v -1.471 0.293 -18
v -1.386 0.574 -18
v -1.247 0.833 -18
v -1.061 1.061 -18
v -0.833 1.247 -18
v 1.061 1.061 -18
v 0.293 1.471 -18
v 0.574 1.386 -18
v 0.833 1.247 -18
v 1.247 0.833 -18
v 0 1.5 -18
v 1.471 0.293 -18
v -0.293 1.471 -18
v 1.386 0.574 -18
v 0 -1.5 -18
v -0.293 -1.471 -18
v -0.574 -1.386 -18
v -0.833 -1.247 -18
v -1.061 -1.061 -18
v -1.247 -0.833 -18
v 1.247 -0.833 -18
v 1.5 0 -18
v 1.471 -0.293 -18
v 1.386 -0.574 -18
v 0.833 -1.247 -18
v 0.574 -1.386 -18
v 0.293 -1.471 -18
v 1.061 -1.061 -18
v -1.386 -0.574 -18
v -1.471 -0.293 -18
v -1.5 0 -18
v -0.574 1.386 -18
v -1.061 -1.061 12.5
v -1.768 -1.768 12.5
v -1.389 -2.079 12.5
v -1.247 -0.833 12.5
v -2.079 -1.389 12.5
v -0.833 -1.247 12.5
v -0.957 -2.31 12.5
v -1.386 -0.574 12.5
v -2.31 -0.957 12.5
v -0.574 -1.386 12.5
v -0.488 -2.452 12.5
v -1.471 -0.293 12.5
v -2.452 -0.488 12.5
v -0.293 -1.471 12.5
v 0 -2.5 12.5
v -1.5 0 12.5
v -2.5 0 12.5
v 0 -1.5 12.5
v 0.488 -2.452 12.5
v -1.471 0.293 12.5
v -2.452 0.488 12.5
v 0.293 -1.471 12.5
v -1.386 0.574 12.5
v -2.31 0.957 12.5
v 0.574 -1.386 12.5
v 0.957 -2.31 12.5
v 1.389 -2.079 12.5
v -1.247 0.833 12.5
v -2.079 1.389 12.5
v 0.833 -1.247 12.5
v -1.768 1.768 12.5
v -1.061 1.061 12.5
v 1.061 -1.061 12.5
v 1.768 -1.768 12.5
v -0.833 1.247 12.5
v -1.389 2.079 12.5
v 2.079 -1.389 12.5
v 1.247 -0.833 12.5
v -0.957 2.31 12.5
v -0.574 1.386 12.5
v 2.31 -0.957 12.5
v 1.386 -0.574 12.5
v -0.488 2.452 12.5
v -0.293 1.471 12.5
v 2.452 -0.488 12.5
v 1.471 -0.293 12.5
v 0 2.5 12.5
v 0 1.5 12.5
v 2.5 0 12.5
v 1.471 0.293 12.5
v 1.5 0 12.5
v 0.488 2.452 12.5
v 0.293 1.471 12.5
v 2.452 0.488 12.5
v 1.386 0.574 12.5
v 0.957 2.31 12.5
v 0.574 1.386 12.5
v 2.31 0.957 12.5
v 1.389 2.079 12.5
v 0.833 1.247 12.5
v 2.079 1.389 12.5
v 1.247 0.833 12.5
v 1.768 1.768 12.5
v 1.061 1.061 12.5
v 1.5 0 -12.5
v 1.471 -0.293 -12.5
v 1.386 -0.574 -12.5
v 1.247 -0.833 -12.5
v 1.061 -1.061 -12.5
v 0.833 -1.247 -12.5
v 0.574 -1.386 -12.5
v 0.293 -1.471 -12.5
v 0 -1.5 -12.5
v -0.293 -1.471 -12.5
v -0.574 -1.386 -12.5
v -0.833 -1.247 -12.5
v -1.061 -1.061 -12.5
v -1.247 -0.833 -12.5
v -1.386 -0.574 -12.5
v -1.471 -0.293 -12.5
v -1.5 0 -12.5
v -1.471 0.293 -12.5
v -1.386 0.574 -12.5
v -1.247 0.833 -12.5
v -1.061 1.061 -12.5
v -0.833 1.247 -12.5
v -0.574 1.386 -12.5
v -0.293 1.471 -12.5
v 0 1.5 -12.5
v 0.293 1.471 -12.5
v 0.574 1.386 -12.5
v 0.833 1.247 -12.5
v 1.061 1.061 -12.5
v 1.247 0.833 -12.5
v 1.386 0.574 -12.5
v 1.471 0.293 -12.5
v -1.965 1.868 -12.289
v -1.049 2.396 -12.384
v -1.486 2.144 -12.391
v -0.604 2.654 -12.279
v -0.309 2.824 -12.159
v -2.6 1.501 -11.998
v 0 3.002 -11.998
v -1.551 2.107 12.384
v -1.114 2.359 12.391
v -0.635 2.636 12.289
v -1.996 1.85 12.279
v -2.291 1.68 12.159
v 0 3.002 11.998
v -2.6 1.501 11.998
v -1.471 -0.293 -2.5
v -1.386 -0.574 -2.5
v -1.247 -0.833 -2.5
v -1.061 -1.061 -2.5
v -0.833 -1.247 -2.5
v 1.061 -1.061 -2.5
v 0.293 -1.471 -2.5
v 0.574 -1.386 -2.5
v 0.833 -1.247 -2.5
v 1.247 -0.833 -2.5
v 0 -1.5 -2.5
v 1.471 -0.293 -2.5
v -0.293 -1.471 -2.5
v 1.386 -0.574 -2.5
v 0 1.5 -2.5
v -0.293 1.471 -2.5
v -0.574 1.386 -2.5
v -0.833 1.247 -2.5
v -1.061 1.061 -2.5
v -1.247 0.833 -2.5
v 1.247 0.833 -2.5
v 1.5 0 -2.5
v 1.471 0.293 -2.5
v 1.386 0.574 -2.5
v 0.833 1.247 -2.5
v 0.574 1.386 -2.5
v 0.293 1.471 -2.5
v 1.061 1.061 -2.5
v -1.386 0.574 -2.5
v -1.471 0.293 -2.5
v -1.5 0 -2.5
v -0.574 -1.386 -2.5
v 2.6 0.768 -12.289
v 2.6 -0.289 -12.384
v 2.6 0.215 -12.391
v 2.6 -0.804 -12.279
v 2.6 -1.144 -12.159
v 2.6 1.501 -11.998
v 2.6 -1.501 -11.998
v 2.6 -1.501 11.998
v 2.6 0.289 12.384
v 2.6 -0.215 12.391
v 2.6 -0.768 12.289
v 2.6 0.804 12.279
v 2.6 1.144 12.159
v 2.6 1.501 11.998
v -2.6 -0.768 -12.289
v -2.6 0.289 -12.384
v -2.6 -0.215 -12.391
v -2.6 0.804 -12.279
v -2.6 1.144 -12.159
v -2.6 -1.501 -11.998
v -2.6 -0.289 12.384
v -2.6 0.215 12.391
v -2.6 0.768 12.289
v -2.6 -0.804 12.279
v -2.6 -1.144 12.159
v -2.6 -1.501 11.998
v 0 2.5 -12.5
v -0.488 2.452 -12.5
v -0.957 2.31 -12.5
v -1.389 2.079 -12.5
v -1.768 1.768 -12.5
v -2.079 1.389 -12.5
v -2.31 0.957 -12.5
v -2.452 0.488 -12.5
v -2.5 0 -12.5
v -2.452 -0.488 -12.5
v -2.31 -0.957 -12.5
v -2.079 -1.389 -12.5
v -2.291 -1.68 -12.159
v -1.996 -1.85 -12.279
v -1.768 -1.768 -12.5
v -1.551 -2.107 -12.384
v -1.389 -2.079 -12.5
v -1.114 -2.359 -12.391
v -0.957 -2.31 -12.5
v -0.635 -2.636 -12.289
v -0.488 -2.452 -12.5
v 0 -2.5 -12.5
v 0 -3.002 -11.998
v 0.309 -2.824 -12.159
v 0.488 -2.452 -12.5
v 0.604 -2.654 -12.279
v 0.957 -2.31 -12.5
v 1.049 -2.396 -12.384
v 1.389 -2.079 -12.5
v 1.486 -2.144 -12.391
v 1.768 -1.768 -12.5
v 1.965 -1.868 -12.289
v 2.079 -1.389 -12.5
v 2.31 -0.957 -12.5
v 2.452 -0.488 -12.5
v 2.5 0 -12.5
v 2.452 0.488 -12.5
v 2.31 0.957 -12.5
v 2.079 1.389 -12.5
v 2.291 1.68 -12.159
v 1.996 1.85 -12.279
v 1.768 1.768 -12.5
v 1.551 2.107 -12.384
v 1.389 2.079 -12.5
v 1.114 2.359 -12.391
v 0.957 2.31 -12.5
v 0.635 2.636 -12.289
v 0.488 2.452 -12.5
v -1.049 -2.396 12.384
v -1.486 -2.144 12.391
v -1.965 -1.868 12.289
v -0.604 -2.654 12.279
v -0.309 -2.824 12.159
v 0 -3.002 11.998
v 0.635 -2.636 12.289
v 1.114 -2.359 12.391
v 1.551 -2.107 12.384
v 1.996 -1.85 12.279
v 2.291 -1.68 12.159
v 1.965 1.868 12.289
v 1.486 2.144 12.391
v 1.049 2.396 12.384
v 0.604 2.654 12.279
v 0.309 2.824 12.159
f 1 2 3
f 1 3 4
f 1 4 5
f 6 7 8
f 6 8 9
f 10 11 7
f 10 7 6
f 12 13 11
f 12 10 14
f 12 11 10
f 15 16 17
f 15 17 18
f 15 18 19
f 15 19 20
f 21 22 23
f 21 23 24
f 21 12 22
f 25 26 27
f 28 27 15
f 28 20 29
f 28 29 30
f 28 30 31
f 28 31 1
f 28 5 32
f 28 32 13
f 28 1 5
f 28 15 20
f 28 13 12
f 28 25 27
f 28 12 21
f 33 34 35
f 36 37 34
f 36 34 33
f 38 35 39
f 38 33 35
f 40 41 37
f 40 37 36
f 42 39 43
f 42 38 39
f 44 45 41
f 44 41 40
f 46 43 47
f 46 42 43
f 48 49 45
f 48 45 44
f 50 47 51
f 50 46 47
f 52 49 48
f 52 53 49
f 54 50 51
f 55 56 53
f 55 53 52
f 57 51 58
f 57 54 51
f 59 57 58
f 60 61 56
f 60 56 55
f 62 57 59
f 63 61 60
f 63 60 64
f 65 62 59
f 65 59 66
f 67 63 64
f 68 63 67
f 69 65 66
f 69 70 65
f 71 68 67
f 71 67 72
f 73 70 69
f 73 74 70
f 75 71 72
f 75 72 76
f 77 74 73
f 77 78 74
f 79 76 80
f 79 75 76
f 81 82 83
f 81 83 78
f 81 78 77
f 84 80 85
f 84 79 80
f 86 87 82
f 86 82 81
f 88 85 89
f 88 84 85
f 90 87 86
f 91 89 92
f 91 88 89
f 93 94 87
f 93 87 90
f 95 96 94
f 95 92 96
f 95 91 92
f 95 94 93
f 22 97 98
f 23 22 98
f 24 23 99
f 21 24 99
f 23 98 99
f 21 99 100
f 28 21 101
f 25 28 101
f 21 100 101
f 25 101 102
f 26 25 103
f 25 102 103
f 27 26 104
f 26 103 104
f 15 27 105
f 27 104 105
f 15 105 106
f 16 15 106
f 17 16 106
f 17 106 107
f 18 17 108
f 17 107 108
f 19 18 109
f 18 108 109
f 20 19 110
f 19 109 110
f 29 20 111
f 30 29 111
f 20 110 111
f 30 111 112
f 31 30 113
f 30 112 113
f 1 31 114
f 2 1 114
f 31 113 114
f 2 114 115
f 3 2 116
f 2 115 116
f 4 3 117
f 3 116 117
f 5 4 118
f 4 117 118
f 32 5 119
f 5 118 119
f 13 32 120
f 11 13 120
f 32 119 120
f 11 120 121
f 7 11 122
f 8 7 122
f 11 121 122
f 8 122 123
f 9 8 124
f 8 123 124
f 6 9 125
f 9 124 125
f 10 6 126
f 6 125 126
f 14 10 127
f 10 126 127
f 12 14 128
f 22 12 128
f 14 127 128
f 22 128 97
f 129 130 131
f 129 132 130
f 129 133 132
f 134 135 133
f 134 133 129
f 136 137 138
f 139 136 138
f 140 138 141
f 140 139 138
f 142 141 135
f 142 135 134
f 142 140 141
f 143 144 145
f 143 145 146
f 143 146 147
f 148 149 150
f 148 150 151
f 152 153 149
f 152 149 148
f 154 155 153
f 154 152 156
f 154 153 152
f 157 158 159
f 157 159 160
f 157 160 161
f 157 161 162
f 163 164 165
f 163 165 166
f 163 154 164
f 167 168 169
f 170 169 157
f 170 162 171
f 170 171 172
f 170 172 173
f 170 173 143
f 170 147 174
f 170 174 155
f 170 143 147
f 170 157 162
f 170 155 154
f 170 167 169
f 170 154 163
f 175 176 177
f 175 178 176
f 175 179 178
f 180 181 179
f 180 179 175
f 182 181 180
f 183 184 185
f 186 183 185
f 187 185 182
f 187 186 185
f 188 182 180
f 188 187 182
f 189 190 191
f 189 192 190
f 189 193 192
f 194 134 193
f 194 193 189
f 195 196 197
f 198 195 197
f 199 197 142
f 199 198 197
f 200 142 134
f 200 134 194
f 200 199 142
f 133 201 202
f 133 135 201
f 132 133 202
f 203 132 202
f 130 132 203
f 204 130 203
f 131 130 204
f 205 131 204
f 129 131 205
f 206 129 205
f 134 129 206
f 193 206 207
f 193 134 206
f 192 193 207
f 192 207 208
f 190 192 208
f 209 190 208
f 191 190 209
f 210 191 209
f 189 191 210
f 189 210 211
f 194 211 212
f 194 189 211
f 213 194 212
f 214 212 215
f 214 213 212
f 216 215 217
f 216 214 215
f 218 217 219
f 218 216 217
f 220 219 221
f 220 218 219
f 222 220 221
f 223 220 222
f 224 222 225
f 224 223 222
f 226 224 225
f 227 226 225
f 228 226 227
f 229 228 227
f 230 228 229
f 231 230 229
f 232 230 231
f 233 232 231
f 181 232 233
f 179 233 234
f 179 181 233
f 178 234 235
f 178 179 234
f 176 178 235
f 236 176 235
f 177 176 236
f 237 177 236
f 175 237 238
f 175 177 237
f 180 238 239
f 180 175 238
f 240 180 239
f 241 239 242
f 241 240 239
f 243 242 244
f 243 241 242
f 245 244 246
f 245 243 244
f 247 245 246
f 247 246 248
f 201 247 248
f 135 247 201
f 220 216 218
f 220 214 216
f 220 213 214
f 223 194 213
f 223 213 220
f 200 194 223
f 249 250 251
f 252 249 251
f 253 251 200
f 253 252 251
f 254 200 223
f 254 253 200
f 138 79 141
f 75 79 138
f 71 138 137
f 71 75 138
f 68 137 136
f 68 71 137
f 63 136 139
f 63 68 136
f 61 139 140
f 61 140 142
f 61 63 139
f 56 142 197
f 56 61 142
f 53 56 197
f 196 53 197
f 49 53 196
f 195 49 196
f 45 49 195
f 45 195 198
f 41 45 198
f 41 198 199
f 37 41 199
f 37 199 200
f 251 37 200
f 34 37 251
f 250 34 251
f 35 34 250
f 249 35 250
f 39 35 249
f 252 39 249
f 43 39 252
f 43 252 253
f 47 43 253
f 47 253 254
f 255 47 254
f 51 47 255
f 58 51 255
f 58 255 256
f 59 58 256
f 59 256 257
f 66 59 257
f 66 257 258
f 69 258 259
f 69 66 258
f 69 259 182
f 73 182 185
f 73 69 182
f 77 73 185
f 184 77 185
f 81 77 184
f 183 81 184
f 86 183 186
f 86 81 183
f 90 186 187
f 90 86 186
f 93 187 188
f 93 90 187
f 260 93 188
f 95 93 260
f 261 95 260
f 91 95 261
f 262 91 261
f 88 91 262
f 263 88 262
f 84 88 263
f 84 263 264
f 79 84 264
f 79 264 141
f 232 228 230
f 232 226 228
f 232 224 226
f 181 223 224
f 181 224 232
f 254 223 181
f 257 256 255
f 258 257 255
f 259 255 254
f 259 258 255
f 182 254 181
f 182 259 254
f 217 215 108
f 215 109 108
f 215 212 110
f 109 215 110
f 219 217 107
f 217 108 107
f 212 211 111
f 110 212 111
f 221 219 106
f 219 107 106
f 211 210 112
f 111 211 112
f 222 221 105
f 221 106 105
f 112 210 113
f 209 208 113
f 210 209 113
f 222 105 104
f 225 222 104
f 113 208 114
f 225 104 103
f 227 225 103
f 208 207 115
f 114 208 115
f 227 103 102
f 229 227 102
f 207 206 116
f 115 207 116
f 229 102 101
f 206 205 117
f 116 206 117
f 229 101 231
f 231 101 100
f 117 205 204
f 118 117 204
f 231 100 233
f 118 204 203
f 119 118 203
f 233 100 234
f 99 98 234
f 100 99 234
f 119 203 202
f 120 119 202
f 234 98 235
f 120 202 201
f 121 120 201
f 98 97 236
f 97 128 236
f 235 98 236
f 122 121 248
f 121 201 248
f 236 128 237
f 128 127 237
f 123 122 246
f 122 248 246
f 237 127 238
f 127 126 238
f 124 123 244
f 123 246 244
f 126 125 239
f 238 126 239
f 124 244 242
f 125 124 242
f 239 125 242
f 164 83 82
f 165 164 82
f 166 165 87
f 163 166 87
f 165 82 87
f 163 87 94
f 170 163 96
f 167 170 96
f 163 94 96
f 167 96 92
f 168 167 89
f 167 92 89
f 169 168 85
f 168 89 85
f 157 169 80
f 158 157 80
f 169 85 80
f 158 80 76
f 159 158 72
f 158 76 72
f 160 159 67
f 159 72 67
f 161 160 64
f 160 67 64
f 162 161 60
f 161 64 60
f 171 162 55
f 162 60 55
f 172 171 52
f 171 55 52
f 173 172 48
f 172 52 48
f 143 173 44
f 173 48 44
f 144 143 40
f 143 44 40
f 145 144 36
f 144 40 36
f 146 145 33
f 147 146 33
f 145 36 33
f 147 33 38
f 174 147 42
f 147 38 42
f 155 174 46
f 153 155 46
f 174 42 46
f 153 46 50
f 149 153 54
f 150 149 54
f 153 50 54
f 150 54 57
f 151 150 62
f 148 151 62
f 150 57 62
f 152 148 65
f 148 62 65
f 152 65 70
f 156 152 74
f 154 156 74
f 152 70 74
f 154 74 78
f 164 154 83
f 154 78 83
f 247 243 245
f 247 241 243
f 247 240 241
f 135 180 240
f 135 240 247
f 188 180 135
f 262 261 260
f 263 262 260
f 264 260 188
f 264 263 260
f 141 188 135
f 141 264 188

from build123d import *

# Parameters (mm, degrees)
PAD_DEPTH    = 12.5
SKETCH001_R  = 1.5
POCKET_DEPTH = 15
SKETCH002_R  = 1.5
PAD001_DEPTH = 5.5


with BuildPart() as body001:
    # Sketch003 → Revolution (revolve)
    with BuildSketch(Plane.YZ):
        Polygon((2, 13), (5, 13), (5, -13), (2, -13), (3.883364, -11.116636), (3.883364, 11.116636), align=None)
    revolve(axis=Axis((0, 0, 0), (0, 0, 1)))


with BuildPart() as cut:
    # Sketch → Pad (new body, symmetric)
    with BuildSketch(Plane.XY):
        Polygon((2.6, 1.501111), (0, 3.002221), (-2.6, 1.501111), (-2.6, -1.501111), (0, -3.002221), (2.6, -1.501111), align=None)
    extrude(amount=PAD_DEPTH, both=True)

    # Sketch001 (on Face8 of Pad) → Pocket (cut)
    with BuildSketch(Plane.XY.offset(12.5)):
        Circle(SKETCH001_R)
    extrude(amount=-POCKET_DEPTH, mode=Mode.SUBTRACT)

    # Sketch002 (on Face4 of Pocket) → Pad001 (join)
    with BuildSketch(Plane(origin=(0, 0, -12.5), x_dir=(1, 0, 0), z_dir=(0, 0, -1))):
        Circle(SKETCH002_R)
    extrude(amount=PAD001_DEPTH)

    # Cut: cut Body001
    add(body001.part, mode=Mode.SUBTRACT)


solid = cut.part
